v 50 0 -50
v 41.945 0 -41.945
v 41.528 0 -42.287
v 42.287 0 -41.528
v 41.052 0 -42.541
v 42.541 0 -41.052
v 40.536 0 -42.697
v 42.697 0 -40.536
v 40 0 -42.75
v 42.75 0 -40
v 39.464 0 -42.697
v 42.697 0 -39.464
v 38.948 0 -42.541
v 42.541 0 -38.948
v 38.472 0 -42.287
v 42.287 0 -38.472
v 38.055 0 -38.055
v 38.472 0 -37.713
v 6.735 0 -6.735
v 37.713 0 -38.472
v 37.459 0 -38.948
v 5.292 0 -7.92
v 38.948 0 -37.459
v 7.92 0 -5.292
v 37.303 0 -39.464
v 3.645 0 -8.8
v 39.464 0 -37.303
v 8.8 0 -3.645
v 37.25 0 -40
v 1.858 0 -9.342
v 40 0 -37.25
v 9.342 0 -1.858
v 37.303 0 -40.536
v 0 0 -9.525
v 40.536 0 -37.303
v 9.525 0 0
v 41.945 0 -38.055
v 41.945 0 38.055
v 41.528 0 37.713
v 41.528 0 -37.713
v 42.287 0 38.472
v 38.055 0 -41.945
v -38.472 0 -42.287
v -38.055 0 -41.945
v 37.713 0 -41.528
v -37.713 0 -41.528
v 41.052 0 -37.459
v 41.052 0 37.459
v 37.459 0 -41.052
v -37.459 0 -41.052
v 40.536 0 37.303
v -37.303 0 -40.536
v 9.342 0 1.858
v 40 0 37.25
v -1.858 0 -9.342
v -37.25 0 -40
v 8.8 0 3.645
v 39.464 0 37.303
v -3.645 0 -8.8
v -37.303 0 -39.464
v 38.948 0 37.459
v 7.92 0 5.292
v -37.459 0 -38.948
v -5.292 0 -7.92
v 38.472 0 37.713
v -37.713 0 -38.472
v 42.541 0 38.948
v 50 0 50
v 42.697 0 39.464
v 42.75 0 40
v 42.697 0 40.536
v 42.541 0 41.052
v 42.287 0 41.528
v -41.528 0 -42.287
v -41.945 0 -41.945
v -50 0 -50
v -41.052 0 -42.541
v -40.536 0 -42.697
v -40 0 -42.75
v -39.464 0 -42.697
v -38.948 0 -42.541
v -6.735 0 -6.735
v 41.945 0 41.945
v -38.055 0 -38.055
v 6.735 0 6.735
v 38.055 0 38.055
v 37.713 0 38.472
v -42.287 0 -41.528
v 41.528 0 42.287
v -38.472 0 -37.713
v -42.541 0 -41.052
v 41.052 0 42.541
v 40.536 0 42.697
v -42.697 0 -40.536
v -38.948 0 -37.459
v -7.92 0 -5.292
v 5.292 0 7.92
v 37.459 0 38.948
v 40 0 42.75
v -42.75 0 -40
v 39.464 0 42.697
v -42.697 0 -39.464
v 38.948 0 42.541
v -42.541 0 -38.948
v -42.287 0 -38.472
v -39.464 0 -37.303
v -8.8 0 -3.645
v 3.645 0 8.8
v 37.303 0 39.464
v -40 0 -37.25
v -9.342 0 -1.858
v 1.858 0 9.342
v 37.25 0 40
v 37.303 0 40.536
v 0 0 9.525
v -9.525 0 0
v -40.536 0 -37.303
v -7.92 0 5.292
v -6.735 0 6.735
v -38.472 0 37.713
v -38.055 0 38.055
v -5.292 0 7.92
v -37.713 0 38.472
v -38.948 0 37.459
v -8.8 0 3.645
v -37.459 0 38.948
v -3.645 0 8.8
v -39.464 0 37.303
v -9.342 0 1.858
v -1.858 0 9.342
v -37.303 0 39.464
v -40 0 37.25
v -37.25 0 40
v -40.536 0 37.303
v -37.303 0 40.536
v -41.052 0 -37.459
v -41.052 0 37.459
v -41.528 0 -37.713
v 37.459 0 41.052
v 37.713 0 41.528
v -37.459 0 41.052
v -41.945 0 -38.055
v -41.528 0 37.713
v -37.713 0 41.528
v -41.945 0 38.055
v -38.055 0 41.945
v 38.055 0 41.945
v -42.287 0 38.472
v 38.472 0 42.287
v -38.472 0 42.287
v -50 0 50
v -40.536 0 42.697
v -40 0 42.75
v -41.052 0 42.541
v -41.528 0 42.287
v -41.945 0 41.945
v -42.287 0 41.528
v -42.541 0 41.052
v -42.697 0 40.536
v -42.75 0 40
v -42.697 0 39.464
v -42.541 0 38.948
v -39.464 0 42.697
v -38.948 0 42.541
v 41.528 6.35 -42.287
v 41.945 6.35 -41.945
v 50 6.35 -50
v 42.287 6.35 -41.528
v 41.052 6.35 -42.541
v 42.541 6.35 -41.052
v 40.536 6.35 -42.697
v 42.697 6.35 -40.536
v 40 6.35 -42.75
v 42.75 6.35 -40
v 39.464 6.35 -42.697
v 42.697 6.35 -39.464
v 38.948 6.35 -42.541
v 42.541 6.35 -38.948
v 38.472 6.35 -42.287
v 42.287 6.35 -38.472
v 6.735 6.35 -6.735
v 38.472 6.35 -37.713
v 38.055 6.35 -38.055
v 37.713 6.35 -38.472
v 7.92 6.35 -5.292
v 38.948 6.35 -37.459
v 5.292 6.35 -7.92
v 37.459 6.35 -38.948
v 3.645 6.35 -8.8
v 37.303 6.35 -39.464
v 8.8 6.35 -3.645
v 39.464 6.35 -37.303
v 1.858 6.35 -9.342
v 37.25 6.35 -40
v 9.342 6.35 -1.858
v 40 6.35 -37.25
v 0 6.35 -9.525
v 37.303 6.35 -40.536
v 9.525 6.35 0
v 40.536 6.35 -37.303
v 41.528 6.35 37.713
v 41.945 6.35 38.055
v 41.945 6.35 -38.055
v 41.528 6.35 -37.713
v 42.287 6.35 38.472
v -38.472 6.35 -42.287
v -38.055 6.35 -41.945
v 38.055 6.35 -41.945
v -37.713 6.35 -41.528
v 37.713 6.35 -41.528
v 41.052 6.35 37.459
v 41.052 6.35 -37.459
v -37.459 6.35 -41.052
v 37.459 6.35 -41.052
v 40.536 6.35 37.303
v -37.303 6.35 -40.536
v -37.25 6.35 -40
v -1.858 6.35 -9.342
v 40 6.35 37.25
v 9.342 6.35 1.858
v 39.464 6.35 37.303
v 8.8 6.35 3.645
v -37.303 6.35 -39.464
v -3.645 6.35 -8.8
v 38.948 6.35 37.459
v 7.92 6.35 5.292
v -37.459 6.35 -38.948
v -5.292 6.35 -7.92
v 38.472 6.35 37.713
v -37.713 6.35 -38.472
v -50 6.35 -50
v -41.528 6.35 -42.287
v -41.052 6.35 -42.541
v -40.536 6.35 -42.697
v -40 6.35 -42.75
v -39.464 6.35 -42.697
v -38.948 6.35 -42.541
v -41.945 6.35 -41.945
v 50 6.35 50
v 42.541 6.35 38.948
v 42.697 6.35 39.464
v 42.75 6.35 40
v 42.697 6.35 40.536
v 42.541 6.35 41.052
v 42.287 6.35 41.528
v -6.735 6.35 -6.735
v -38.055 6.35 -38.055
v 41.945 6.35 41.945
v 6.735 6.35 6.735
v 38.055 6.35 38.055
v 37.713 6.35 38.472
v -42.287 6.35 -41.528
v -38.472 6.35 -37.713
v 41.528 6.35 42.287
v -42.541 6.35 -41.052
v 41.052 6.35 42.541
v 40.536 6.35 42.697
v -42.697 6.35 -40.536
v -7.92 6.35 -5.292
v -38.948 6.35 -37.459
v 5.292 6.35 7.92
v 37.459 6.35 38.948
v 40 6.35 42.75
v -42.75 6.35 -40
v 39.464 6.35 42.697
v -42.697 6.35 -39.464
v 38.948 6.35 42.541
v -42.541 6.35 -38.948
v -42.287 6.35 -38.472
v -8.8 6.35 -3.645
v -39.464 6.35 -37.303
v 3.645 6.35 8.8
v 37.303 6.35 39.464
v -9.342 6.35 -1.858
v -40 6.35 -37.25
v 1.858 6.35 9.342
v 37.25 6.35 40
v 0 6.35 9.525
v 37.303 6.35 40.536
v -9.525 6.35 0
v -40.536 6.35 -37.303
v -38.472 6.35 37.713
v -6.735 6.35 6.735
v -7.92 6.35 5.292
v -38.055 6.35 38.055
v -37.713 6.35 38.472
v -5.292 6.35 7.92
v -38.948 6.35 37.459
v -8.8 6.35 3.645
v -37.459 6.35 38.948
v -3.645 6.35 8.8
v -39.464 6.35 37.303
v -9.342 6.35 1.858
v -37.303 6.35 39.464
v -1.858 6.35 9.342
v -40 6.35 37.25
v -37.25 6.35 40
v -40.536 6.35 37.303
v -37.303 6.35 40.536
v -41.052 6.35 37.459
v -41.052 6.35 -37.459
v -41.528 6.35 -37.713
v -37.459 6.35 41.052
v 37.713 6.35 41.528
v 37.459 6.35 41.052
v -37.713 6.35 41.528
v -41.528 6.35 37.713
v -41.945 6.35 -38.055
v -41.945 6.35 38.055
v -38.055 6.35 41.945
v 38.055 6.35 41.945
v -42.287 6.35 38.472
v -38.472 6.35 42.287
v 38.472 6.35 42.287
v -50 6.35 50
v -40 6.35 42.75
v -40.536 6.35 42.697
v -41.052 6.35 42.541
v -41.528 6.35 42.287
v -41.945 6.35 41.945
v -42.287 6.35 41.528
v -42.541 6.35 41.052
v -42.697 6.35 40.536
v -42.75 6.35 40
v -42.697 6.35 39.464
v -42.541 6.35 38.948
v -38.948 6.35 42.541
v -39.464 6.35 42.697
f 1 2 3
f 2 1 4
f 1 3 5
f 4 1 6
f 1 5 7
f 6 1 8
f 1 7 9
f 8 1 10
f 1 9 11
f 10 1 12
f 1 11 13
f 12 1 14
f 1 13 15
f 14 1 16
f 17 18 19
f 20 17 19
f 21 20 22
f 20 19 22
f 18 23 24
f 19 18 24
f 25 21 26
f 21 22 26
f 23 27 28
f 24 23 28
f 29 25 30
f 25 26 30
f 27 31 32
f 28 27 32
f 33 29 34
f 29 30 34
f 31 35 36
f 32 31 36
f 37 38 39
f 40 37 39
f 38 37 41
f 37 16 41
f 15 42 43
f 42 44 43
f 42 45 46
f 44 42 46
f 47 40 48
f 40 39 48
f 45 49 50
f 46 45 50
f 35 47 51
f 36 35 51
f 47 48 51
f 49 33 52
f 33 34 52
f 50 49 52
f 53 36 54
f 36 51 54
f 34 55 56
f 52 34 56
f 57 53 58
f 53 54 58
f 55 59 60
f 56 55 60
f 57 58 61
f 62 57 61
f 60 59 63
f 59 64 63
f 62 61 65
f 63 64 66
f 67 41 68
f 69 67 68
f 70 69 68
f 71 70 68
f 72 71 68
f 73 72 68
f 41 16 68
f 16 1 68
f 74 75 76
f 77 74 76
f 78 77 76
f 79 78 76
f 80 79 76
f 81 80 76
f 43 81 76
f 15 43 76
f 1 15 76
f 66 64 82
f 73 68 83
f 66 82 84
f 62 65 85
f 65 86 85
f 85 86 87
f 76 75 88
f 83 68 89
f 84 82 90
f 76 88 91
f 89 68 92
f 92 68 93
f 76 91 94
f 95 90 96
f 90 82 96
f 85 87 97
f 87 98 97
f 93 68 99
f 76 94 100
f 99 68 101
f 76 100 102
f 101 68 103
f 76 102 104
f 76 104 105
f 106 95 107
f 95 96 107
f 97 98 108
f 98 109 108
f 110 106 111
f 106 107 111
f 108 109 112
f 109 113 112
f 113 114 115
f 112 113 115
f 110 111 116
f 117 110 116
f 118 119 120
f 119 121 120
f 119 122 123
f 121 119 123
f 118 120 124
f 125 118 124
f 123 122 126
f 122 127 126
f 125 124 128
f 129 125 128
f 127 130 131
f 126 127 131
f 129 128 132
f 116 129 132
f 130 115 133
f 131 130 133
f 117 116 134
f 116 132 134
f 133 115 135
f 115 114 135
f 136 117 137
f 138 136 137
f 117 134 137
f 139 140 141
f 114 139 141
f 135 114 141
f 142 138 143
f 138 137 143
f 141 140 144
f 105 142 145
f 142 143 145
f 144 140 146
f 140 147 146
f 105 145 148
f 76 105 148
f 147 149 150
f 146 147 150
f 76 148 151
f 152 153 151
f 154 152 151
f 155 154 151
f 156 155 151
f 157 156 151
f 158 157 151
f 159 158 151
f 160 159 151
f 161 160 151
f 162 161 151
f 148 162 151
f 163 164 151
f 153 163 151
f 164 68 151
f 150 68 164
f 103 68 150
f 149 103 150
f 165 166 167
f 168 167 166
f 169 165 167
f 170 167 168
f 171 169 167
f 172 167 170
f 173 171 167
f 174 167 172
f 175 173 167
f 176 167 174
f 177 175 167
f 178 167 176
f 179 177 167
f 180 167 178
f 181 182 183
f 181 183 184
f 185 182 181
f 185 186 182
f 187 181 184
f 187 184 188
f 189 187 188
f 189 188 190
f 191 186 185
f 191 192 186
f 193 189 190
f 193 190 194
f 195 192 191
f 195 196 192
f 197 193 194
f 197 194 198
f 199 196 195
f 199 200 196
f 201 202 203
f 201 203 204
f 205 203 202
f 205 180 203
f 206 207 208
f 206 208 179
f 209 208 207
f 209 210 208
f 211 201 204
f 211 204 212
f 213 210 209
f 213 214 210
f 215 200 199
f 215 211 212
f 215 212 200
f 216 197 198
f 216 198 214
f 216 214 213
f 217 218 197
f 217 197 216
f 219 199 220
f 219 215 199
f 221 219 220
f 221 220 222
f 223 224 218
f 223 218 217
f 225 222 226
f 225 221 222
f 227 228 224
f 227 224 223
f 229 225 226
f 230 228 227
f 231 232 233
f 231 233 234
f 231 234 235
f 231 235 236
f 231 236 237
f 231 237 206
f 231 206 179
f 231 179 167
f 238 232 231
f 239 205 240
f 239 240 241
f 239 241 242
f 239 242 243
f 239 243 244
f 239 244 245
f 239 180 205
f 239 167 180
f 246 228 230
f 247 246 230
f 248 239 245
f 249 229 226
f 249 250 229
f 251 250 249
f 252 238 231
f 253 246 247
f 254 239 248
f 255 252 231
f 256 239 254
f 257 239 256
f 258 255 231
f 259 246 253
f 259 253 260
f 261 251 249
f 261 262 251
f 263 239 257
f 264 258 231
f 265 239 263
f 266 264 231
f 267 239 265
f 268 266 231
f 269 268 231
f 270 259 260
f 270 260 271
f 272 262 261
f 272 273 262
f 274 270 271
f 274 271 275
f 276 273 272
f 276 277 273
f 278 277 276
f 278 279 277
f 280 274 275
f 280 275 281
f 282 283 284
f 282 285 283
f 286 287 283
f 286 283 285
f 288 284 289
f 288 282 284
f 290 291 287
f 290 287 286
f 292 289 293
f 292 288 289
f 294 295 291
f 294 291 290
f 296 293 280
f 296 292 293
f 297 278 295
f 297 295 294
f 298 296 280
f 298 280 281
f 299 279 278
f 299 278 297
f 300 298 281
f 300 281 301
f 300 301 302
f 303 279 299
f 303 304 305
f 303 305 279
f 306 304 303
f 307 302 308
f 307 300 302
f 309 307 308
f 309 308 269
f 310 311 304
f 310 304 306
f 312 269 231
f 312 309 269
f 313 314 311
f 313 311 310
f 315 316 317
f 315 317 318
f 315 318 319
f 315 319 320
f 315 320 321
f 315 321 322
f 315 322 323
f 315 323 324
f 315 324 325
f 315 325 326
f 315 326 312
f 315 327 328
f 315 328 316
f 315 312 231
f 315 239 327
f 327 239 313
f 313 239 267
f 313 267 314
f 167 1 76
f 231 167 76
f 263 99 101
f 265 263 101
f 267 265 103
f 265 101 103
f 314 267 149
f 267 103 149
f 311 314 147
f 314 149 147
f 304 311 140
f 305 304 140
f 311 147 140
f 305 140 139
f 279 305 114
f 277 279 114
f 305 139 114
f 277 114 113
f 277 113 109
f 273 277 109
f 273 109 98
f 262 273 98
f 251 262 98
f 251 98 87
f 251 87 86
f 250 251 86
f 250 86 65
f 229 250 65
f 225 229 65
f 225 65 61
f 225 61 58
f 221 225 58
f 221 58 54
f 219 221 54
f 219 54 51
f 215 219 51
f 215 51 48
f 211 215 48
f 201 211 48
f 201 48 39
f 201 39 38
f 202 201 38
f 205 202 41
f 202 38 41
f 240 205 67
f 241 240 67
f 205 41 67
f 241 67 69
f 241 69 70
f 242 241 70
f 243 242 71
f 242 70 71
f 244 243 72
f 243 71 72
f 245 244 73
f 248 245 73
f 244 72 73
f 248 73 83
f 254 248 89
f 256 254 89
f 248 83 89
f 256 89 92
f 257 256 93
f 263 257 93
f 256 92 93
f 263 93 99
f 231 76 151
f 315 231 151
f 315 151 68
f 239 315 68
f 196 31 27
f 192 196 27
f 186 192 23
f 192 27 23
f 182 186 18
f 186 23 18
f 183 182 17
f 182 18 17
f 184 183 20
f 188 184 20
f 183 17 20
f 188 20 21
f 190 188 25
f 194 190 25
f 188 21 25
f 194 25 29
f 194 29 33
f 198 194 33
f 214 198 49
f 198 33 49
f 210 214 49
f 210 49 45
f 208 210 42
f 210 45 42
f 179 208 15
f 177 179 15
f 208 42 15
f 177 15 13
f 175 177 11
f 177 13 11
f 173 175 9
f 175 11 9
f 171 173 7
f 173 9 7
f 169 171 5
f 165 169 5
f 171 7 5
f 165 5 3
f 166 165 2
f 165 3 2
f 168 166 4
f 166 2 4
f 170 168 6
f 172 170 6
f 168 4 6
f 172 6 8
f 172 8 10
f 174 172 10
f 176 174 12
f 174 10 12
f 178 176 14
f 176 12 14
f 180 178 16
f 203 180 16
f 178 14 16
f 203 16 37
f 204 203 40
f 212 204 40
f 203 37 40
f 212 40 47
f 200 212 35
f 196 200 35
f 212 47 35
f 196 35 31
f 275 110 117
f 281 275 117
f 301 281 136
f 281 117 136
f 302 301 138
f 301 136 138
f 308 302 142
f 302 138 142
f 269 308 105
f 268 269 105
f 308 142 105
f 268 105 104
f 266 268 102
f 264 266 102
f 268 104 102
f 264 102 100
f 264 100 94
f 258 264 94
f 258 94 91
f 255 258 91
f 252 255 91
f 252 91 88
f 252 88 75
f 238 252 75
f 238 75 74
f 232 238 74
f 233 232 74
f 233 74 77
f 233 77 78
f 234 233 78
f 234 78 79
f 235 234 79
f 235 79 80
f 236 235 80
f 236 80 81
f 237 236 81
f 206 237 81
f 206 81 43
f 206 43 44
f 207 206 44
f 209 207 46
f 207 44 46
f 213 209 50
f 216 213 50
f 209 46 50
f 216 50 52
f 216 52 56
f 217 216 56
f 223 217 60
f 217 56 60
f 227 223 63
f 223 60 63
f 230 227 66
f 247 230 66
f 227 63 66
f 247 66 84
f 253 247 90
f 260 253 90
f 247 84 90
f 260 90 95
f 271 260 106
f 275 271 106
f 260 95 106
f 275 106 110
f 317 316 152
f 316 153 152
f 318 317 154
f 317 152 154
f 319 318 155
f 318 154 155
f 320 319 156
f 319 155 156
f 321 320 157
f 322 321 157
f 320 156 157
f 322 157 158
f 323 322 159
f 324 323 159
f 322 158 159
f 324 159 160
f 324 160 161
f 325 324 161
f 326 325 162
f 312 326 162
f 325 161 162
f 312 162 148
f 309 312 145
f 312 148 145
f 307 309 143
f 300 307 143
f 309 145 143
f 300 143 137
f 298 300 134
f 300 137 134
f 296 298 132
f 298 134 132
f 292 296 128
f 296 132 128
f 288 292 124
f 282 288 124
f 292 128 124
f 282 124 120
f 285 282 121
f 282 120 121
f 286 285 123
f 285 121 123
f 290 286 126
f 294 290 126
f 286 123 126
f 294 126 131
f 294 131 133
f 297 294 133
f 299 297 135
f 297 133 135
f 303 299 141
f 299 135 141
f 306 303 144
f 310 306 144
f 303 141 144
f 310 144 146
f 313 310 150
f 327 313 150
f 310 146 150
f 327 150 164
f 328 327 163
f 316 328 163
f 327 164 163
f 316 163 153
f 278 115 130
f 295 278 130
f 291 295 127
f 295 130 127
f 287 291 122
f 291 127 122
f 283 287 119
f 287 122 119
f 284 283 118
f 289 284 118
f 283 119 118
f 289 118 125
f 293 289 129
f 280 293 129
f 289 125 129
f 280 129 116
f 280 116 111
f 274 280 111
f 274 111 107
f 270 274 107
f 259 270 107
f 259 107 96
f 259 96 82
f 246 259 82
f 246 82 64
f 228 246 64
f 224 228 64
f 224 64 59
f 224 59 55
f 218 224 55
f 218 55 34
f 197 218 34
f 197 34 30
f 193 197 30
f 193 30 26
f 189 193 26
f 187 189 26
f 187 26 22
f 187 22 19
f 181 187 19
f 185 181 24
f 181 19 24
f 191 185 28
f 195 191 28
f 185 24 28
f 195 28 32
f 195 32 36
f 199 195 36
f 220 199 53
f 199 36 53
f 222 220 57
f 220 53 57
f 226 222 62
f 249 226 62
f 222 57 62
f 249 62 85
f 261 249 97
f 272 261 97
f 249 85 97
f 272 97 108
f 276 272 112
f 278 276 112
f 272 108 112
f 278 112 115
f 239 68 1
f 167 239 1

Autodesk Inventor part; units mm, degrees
ref_plane "YZ Plane" through (0, 0, 0) normal (1, 0, 0) x (0, 1, 0)
ref_plane "XZ Plane" through (0, 0, 0) normal (0, 1, 0) x (-1, 0, 0)
ref_plane "XY Plane" through (0, 0, 0) normal (0, 0, 1) x (1, 0, 0)
sketch "Sketch1" plane through (0, 0, 0) normal (0, 1, 0) x (-1, 0, 0)
  line L0 (50, 50) -> (-50, 50)
  line L1 (-50, 50) -> (-50, -50)
  line L2 (-50, -50) -> (50, -50)
  line L3 (50, -50) -> (50, 50)
  line L4 (50, 50) -> (-50, -50) construction
  line L5 (-50, 50) -> (50, -50) construction
  point P0 (0, 0)
  dimension "d0" = 100
  dimension "d1" = 100
extrude "Extrusion1" add sketch "Sketch1" along normal blind 6.35
sketch "Sketch2" plane through (0, 6.35, 0) normal (0, 1, 0) x (1, 0, 0)
  line L0 (40, -40) -> (-40, -40) construction
  line L1 (-40, -40) -> (-40, 40) construction
  line L2 (-40, 40) -> (40, 40) construction
  line L3 (40, 40) -> (40, -40) construction
  line L4 (40, -40) -> (-40, 40) construction
  line L5 (-40, -40) -> (40, 40) construction
  line L6 (-50, -50) -> (50, -50) projected
  line L7 (50, -50) -> (50, 50) projected
  line L8 (50, 50) -> (-50, 50) projected
  line L9 (-50, 50) -> (-50, -50) projected
  point P0 (0, 0)
  dimension "d4" = 80
  dimension "d5" = 80
  dimension "d20" = 100
hole "Hole1" at (-40, 6.35, 40) at (-40, 6.35, -40) at (40, 6.35, -40) at (40, 6.35, 40) direction (0, -1, 0) diameter 5.5 depth 8 tip angle 118 clearance for "Hex Head Bolt" size "M5" standard "Ansi Metric M Profile"
sketch "Sketch3" plane through (0, 6.35, 0) normal (0, 1, 0) x (1, 0, 0)
  point P0 (0, 0)
  point P1 (0, 0)
hole "Hole2" at (0, 6.35, 0) direction (0, -1, 0) diameter 19.05 end through all
equation "\"d5\" = d4"
properties part number "topPlate"
